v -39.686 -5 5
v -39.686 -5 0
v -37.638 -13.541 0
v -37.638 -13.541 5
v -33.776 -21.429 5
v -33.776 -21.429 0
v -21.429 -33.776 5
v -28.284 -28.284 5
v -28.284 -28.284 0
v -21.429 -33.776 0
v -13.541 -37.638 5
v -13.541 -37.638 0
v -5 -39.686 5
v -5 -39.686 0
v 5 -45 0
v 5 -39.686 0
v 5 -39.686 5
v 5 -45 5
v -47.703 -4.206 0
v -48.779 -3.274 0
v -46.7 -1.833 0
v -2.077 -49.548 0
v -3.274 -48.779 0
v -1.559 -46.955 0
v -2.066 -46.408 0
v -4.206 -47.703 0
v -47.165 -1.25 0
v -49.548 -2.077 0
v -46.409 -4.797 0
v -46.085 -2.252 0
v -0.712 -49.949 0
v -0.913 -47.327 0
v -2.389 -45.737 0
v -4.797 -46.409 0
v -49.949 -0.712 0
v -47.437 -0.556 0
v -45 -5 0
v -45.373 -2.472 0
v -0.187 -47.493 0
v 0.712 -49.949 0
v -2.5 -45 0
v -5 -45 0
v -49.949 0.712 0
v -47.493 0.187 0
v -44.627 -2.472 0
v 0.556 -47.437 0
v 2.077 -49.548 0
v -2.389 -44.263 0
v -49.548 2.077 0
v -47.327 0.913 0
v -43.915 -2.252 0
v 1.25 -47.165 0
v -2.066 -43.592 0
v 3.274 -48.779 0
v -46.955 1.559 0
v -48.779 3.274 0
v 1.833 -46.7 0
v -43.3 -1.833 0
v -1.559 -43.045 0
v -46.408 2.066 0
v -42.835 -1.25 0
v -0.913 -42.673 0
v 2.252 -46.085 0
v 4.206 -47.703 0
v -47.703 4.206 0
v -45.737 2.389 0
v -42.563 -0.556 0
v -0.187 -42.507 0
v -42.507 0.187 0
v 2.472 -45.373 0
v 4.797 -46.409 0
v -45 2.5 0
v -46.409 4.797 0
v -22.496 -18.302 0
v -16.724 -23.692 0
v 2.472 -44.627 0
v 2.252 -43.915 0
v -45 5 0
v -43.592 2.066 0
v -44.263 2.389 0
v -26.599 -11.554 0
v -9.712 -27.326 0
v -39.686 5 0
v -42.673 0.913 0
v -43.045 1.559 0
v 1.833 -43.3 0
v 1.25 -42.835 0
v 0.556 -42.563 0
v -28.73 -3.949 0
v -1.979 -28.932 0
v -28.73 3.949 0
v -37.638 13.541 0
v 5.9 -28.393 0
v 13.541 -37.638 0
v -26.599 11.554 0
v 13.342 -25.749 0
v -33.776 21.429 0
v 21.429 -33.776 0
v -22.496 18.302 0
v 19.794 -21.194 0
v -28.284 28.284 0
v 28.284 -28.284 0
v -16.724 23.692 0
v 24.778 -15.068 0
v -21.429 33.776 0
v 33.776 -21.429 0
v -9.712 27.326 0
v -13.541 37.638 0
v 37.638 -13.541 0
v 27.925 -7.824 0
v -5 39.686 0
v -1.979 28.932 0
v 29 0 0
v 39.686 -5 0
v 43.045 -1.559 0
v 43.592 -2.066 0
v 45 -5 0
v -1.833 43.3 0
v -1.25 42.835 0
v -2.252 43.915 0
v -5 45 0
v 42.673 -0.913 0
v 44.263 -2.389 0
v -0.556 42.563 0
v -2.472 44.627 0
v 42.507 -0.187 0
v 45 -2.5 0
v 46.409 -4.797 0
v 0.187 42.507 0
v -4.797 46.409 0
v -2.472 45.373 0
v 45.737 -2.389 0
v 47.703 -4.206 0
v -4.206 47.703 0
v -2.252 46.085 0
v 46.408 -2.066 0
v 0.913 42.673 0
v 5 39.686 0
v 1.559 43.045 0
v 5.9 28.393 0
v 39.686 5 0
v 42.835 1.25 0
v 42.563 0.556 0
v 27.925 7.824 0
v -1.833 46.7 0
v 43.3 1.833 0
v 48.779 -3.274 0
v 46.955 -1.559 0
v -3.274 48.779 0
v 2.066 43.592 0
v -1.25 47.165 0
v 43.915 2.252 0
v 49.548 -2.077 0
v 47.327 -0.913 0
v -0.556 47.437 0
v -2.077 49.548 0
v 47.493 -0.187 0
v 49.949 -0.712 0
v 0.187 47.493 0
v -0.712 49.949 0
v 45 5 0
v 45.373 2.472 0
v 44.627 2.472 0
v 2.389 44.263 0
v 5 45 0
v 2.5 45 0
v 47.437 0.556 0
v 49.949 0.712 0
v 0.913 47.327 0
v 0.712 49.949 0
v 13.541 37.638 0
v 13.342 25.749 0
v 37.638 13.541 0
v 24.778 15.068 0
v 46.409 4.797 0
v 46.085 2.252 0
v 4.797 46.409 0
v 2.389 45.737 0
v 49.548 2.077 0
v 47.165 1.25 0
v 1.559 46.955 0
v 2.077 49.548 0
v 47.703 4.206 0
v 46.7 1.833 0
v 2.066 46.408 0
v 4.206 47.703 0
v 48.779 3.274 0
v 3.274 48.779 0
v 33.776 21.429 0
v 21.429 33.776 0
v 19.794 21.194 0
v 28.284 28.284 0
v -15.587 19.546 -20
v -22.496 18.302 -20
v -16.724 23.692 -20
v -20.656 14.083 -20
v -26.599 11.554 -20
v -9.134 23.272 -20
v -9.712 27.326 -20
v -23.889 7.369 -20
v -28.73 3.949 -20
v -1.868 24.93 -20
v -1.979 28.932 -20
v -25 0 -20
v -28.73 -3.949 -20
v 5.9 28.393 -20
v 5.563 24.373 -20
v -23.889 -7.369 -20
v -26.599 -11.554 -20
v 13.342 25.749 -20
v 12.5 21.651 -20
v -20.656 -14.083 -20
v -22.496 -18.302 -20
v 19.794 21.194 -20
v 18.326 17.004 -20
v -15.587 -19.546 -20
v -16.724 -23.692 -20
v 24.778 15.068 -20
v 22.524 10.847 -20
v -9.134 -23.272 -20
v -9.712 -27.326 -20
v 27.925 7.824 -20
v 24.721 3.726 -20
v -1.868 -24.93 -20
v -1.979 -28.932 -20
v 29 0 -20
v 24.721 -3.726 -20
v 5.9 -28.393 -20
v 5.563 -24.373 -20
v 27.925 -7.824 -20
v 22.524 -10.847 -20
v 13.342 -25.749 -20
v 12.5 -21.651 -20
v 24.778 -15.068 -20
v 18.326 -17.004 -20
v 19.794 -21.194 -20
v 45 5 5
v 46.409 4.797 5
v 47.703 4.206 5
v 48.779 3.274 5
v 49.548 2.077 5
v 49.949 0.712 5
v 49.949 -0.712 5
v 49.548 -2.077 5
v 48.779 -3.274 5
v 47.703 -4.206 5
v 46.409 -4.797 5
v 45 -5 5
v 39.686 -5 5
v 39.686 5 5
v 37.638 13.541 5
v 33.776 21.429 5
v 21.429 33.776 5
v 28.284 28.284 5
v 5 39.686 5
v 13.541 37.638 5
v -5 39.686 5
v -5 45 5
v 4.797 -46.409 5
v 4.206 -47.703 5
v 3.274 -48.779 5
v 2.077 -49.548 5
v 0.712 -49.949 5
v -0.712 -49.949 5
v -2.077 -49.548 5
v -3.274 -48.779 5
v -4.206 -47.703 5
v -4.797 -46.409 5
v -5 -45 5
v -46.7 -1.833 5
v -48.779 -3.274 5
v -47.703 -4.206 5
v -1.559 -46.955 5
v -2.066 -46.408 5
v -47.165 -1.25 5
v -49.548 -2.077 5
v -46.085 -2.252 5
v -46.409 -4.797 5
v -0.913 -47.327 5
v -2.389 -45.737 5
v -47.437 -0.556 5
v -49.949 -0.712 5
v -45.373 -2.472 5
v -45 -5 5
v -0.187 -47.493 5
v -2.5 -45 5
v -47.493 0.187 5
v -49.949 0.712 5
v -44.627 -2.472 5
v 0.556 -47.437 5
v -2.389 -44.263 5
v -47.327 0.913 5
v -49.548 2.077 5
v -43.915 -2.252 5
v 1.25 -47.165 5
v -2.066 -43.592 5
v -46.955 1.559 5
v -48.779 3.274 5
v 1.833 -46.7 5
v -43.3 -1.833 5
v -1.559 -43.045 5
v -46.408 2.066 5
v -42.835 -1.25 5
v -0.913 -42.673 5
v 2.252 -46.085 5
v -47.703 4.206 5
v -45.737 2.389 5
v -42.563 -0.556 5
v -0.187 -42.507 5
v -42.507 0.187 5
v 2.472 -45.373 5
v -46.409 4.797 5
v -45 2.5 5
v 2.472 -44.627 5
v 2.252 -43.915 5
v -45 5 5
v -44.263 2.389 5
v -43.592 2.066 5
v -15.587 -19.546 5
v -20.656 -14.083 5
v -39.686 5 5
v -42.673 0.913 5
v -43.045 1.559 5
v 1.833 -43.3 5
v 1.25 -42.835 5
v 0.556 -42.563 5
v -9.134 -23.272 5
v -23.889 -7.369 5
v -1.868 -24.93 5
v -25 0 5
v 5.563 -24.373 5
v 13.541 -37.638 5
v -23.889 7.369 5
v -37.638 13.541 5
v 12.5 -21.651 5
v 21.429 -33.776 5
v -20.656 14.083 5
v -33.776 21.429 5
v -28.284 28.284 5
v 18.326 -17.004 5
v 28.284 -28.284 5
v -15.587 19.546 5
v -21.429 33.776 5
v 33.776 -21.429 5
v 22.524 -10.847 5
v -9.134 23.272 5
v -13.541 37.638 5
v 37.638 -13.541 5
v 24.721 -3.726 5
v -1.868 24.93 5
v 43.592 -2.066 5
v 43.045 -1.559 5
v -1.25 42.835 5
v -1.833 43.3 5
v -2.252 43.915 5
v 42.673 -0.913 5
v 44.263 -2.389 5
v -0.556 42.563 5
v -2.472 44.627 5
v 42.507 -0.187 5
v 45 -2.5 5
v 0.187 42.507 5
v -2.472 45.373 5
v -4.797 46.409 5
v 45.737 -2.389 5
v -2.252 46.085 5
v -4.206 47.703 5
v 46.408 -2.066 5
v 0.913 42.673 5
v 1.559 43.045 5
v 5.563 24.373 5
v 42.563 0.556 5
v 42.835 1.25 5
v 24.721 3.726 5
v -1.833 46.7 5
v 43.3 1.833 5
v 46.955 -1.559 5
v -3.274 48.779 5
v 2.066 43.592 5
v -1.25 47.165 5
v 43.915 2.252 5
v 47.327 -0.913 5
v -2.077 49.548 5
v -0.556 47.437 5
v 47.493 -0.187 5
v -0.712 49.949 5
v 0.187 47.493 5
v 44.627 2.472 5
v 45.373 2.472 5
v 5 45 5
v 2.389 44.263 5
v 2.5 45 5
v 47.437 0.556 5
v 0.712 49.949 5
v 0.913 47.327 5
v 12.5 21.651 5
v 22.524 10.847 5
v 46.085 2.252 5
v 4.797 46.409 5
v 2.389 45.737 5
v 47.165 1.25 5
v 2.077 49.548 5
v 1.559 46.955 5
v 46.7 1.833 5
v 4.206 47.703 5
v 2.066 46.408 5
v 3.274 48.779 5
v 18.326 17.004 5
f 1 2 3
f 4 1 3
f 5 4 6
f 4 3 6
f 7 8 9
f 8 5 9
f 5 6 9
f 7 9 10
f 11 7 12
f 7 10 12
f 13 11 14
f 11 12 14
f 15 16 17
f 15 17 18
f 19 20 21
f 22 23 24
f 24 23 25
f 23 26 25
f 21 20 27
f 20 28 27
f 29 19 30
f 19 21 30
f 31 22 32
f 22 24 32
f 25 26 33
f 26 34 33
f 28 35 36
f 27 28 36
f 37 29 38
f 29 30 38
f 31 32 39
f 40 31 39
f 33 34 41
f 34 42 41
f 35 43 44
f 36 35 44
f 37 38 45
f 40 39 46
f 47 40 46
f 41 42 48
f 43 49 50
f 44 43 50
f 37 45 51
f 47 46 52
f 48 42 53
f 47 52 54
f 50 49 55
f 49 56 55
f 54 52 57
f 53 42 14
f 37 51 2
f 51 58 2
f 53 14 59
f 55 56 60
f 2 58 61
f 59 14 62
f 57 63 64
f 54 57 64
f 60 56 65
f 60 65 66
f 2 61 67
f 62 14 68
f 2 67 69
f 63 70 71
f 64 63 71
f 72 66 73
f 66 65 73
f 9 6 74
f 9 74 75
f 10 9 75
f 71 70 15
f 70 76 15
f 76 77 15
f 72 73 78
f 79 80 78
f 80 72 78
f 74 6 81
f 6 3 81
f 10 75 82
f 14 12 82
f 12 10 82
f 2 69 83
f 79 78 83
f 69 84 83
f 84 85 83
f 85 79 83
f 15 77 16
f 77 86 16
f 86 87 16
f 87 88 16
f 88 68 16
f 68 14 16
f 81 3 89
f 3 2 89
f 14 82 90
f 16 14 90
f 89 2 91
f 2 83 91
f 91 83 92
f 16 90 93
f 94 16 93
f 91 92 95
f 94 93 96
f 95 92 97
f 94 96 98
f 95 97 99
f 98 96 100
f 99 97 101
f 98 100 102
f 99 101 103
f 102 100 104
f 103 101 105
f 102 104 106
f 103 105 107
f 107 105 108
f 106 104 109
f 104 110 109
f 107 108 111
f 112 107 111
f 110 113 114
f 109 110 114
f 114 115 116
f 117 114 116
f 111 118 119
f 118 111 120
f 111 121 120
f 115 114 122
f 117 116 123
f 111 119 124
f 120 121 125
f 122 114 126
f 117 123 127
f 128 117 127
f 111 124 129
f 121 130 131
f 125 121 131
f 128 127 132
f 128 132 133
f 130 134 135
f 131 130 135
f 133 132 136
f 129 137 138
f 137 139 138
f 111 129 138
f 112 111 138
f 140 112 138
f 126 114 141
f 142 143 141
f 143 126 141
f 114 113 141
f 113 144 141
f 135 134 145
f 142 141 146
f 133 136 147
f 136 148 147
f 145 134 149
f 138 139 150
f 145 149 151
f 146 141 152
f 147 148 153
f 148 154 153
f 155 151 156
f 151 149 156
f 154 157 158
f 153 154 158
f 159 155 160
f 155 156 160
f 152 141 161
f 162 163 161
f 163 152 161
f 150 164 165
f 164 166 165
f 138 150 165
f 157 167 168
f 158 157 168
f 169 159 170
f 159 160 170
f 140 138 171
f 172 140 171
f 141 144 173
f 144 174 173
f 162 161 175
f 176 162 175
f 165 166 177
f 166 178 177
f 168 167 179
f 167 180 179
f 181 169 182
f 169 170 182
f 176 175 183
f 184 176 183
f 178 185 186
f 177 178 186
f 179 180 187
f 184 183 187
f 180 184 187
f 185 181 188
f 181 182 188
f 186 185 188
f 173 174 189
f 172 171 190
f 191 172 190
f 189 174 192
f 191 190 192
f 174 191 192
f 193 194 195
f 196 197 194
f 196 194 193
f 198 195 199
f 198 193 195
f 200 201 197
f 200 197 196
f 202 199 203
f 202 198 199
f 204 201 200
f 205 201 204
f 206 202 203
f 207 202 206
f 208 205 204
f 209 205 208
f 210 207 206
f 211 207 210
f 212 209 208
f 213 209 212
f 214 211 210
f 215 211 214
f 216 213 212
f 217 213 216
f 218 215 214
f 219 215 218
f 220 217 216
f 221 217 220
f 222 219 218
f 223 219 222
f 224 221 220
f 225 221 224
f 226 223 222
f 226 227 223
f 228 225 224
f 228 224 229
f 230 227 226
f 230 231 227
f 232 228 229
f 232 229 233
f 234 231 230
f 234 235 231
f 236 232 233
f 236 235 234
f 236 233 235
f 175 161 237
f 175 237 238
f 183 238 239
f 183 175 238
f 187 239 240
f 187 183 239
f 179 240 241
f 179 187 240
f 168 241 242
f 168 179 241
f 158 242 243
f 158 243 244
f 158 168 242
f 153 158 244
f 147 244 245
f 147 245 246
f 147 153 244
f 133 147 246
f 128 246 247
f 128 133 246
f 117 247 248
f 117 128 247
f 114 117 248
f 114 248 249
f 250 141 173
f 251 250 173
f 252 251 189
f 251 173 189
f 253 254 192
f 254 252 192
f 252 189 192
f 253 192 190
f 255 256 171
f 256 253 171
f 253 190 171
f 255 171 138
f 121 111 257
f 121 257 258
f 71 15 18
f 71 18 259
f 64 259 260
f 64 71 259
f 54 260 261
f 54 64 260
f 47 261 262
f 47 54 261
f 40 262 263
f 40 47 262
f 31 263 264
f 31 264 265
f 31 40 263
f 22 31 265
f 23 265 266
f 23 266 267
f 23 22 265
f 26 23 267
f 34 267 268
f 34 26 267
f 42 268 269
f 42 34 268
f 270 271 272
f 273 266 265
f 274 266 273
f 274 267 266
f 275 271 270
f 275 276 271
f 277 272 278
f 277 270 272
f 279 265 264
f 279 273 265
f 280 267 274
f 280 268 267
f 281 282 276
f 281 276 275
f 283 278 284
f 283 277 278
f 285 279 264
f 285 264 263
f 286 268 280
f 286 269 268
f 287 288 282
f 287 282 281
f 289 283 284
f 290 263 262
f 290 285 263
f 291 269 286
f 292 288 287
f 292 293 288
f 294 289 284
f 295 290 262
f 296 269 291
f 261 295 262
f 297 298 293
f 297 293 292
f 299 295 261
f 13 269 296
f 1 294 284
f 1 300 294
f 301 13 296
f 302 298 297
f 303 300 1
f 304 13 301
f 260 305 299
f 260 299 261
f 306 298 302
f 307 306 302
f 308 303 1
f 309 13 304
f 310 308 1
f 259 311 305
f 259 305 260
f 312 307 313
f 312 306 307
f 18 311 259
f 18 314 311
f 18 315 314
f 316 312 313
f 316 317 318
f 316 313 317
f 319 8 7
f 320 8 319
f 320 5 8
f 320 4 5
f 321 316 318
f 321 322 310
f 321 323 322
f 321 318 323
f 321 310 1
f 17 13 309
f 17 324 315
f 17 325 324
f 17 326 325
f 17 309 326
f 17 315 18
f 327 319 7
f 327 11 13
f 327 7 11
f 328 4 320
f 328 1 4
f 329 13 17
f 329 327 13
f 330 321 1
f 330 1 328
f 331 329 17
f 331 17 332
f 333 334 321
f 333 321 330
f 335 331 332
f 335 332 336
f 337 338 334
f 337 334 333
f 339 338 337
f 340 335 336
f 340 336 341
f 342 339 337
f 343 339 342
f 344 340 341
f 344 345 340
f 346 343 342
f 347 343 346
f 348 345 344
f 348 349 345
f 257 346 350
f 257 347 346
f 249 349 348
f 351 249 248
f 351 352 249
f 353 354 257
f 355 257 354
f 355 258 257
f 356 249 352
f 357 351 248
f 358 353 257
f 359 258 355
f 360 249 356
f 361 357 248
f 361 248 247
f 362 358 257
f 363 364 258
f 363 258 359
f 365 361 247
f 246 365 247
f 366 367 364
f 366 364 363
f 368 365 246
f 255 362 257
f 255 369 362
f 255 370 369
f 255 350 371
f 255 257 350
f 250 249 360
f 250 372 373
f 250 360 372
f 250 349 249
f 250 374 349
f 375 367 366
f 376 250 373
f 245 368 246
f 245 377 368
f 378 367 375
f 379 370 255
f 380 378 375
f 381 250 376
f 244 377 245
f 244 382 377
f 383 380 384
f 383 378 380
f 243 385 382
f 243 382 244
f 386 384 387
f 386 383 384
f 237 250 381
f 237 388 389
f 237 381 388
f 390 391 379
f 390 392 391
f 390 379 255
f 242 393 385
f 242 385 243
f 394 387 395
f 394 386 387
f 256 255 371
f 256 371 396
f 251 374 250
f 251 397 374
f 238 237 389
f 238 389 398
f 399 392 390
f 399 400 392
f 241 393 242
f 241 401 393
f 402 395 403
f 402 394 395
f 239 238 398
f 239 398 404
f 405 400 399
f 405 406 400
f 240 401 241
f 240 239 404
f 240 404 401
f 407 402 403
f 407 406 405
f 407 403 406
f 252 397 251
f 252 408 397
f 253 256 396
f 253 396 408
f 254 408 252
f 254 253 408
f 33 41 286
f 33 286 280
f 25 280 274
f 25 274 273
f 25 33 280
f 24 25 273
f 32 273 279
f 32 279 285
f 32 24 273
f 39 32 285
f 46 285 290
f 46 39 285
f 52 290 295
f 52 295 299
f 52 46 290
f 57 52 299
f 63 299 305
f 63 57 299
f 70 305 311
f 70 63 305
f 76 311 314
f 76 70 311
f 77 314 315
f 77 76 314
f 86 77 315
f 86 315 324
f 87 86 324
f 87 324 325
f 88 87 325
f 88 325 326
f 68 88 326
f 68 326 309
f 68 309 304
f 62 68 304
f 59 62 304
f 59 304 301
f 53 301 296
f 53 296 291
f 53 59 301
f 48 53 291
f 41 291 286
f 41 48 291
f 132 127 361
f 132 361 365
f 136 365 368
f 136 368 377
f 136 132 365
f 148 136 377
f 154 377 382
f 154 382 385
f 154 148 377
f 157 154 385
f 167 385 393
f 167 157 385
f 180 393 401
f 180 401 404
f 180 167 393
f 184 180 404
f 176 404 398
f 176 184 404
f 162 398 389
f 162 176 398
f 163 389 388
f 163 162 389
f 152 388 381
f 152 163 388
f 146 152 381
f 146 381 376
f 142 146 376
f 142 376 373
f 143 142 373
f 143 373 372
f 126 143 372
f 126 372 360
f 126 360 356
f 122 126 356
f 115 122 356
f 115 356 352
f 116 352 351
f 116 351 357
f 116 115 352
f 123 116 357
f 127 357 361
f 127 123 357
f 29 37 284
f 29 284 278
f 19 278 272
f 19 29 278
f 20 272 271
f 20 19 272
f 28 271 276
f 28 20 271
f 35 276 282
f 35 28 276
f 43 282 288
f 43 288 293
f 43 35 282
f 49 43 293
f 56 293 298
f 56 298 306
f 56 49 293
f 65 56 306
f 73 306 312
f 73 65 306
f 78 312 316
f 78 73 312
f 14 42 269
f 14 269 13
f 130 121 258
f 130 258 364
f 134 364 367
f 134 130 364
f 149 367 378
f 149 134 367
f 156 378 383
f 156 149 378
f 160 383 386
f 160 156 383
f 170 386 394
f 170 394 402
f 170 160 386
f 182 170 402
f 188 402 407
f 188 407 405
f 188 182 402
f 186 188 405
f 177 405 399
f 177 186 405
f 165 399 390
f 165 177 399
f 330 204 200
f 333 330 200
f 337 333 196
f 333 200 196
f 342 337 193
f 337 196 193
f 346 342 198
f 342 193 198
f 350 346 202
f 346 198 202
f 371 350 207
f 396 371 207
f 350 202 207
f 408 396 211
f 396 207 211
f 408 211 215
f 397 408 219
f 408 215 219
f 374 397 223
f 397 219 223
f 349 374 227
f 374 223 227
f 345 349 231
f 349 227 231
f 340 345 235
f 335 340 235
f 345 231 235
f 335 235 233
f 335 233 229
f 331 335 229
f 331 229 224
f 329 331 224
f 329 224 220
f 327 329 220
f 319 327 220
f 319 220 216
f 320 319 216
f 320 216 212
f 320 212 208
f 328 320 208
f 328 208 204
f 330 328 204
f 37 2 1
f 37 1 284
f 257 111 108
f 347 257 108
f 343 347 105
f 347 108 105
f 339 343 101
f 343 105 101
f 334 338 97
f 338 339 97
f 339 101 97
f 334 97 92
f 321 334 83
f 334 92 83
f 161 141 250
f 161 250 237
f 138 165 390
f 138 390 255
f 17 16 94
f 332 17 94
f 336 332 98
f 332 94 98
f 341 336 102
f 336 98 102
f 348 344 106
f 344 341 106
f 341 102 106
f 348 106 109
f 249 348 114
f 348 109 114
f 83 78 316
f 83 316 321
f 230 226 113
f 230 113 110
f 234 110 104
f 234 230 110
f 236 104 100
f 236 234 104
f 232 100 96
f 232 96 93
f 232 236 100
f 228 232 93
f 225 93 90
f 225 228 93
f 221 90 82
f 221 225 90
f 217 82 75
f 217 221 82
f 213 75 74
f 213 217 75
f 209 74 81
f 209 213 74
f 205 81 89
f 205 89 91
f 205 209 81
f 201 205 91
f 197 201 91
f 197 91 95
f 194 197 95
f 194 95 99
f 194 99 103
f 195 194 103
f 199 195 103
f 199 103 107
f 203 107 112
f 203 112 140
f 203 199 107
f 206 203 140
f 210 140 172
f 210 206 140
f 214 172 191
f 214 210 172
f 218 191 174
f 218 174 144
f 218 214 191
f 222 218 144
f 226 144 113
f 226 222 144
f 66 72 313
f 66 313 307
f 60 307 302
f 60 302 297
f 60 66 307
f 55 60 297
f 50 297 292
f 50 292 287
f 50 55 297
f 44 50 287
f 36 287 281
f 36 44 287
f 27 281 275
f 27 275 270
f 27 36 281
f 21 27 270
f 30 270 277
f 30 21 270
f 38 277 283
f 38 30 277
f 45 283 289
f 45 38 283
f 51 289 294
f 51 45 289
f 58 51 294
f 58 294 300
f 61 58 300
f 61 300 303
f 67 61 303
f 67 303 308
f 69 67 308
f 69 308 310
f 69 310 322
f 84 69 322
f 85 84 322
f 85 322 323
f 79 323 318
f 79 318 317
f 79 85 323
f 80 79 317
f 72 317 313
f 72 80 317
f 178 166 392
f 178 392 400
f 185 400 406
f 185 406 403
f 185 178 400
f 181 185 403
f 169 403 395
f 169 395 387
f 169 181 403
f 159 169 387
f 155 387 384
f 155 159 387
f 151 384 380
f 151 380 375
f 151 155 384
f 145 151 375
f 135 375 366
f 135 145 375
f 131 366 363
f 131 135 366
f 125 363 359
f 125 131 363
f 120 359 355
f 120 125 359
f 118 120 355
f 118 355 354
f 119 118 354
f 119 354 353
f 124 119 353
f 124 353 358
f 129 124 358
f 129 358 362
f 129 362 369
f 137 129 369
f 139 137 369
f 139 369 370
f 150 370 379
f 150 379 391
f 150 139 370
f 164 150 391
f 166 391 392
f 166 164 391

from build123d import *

# Parameters (mm, degrees)
SKETCH2_R           = 40
BOSS_EXTRUDE2_DEPTH = 5
SKETCH3_R           = 25
CUT_EXTRUDE2_DEPTH  = 8
BOSS_EXTRUDE3_START = 20
SKETCH4_R           = 29
SKETCH4_R_2         = 25
BOSS_EXTRUDE3_DEPTH = 20
BOSS_EXTRUDE4_START = -5
SKETCH5_R           = 2.5
BOSS_EXTRUDE4_DEPTH = 5
CIRPATTERN1_COUNT   = 4


with BuildPart() as part:
    # Sketch2 → Boss-Extrude2 (new body)
    with BuildSketch(Plane.XY):
        Circle(SKETCH2_R)
    extrude(amount=BOSS_EXTRUDE2_DEPTH)

    # Sketch3 → Cut-Extrude2 (cut)
    with BuildSketch(Plane(origin=(0, 0, 0), x_dir=(-1, 0, 0), z_dir=(0, 0, -1))):
        Circle(SKETCH3_R)
    extrude(amount=-CUT_EXTRUDE2_DEPTH, mode=Mode.SUBTRACT)

    # Sketch4 → Boss-Extrude3 (add)
    with BuildSketch(Plane(origin=(0, 0, 0), x_dir=(-1, 0, 0), z_dir=(0, 0, -1)).offset(BOSS_EXTRUDE3_START)):
        with Locations(Location((0, 0, 0), (0, 0, 180))):
            Circle(SKETCH4_R)
        Circle(SKETCH4_R_2, mode=Mode.SUBTRACT)
    extrude(amount=-BOSS_EXTRUDE3_DEPTH)

    # Sketch5 → Boss-Extrude4 (add)
    with BuildSketch(Plane.XY.offset(5).offset(BOSS_EXTRUDE4_START)):
        with BuildLine():
            Line((-5, 39.686269666), (-5, 45))
            ThreePointArc((-5, 45), (0, 50), (5, 45))
            Line((5, 45), (5, 39.686269666))
            ThreePointArc((5, 39.686269666), (0, 40), (-5, 39.686269666))
        make_face()
        with Locations((0, 45)):
            Circle(SKETCH5_R, mode=Mode.SUBTRACT)
    boss_extrude4 = extrude(amount=BOSS_EXTRUDE4_DEPTH)

    # CirPattern1: Boss-Extrude4 ×4 about axis
    cirpattern1_axis = Axis((0, 0, 0), (0, 0, 1))
    for i in range(1, CIRPATTERN1_COUNT):
        add(boss_extrude4.rotate(cirpattern1_axis, i * 360 / CIRPATTERN1_COUNT))


solid = part.part
